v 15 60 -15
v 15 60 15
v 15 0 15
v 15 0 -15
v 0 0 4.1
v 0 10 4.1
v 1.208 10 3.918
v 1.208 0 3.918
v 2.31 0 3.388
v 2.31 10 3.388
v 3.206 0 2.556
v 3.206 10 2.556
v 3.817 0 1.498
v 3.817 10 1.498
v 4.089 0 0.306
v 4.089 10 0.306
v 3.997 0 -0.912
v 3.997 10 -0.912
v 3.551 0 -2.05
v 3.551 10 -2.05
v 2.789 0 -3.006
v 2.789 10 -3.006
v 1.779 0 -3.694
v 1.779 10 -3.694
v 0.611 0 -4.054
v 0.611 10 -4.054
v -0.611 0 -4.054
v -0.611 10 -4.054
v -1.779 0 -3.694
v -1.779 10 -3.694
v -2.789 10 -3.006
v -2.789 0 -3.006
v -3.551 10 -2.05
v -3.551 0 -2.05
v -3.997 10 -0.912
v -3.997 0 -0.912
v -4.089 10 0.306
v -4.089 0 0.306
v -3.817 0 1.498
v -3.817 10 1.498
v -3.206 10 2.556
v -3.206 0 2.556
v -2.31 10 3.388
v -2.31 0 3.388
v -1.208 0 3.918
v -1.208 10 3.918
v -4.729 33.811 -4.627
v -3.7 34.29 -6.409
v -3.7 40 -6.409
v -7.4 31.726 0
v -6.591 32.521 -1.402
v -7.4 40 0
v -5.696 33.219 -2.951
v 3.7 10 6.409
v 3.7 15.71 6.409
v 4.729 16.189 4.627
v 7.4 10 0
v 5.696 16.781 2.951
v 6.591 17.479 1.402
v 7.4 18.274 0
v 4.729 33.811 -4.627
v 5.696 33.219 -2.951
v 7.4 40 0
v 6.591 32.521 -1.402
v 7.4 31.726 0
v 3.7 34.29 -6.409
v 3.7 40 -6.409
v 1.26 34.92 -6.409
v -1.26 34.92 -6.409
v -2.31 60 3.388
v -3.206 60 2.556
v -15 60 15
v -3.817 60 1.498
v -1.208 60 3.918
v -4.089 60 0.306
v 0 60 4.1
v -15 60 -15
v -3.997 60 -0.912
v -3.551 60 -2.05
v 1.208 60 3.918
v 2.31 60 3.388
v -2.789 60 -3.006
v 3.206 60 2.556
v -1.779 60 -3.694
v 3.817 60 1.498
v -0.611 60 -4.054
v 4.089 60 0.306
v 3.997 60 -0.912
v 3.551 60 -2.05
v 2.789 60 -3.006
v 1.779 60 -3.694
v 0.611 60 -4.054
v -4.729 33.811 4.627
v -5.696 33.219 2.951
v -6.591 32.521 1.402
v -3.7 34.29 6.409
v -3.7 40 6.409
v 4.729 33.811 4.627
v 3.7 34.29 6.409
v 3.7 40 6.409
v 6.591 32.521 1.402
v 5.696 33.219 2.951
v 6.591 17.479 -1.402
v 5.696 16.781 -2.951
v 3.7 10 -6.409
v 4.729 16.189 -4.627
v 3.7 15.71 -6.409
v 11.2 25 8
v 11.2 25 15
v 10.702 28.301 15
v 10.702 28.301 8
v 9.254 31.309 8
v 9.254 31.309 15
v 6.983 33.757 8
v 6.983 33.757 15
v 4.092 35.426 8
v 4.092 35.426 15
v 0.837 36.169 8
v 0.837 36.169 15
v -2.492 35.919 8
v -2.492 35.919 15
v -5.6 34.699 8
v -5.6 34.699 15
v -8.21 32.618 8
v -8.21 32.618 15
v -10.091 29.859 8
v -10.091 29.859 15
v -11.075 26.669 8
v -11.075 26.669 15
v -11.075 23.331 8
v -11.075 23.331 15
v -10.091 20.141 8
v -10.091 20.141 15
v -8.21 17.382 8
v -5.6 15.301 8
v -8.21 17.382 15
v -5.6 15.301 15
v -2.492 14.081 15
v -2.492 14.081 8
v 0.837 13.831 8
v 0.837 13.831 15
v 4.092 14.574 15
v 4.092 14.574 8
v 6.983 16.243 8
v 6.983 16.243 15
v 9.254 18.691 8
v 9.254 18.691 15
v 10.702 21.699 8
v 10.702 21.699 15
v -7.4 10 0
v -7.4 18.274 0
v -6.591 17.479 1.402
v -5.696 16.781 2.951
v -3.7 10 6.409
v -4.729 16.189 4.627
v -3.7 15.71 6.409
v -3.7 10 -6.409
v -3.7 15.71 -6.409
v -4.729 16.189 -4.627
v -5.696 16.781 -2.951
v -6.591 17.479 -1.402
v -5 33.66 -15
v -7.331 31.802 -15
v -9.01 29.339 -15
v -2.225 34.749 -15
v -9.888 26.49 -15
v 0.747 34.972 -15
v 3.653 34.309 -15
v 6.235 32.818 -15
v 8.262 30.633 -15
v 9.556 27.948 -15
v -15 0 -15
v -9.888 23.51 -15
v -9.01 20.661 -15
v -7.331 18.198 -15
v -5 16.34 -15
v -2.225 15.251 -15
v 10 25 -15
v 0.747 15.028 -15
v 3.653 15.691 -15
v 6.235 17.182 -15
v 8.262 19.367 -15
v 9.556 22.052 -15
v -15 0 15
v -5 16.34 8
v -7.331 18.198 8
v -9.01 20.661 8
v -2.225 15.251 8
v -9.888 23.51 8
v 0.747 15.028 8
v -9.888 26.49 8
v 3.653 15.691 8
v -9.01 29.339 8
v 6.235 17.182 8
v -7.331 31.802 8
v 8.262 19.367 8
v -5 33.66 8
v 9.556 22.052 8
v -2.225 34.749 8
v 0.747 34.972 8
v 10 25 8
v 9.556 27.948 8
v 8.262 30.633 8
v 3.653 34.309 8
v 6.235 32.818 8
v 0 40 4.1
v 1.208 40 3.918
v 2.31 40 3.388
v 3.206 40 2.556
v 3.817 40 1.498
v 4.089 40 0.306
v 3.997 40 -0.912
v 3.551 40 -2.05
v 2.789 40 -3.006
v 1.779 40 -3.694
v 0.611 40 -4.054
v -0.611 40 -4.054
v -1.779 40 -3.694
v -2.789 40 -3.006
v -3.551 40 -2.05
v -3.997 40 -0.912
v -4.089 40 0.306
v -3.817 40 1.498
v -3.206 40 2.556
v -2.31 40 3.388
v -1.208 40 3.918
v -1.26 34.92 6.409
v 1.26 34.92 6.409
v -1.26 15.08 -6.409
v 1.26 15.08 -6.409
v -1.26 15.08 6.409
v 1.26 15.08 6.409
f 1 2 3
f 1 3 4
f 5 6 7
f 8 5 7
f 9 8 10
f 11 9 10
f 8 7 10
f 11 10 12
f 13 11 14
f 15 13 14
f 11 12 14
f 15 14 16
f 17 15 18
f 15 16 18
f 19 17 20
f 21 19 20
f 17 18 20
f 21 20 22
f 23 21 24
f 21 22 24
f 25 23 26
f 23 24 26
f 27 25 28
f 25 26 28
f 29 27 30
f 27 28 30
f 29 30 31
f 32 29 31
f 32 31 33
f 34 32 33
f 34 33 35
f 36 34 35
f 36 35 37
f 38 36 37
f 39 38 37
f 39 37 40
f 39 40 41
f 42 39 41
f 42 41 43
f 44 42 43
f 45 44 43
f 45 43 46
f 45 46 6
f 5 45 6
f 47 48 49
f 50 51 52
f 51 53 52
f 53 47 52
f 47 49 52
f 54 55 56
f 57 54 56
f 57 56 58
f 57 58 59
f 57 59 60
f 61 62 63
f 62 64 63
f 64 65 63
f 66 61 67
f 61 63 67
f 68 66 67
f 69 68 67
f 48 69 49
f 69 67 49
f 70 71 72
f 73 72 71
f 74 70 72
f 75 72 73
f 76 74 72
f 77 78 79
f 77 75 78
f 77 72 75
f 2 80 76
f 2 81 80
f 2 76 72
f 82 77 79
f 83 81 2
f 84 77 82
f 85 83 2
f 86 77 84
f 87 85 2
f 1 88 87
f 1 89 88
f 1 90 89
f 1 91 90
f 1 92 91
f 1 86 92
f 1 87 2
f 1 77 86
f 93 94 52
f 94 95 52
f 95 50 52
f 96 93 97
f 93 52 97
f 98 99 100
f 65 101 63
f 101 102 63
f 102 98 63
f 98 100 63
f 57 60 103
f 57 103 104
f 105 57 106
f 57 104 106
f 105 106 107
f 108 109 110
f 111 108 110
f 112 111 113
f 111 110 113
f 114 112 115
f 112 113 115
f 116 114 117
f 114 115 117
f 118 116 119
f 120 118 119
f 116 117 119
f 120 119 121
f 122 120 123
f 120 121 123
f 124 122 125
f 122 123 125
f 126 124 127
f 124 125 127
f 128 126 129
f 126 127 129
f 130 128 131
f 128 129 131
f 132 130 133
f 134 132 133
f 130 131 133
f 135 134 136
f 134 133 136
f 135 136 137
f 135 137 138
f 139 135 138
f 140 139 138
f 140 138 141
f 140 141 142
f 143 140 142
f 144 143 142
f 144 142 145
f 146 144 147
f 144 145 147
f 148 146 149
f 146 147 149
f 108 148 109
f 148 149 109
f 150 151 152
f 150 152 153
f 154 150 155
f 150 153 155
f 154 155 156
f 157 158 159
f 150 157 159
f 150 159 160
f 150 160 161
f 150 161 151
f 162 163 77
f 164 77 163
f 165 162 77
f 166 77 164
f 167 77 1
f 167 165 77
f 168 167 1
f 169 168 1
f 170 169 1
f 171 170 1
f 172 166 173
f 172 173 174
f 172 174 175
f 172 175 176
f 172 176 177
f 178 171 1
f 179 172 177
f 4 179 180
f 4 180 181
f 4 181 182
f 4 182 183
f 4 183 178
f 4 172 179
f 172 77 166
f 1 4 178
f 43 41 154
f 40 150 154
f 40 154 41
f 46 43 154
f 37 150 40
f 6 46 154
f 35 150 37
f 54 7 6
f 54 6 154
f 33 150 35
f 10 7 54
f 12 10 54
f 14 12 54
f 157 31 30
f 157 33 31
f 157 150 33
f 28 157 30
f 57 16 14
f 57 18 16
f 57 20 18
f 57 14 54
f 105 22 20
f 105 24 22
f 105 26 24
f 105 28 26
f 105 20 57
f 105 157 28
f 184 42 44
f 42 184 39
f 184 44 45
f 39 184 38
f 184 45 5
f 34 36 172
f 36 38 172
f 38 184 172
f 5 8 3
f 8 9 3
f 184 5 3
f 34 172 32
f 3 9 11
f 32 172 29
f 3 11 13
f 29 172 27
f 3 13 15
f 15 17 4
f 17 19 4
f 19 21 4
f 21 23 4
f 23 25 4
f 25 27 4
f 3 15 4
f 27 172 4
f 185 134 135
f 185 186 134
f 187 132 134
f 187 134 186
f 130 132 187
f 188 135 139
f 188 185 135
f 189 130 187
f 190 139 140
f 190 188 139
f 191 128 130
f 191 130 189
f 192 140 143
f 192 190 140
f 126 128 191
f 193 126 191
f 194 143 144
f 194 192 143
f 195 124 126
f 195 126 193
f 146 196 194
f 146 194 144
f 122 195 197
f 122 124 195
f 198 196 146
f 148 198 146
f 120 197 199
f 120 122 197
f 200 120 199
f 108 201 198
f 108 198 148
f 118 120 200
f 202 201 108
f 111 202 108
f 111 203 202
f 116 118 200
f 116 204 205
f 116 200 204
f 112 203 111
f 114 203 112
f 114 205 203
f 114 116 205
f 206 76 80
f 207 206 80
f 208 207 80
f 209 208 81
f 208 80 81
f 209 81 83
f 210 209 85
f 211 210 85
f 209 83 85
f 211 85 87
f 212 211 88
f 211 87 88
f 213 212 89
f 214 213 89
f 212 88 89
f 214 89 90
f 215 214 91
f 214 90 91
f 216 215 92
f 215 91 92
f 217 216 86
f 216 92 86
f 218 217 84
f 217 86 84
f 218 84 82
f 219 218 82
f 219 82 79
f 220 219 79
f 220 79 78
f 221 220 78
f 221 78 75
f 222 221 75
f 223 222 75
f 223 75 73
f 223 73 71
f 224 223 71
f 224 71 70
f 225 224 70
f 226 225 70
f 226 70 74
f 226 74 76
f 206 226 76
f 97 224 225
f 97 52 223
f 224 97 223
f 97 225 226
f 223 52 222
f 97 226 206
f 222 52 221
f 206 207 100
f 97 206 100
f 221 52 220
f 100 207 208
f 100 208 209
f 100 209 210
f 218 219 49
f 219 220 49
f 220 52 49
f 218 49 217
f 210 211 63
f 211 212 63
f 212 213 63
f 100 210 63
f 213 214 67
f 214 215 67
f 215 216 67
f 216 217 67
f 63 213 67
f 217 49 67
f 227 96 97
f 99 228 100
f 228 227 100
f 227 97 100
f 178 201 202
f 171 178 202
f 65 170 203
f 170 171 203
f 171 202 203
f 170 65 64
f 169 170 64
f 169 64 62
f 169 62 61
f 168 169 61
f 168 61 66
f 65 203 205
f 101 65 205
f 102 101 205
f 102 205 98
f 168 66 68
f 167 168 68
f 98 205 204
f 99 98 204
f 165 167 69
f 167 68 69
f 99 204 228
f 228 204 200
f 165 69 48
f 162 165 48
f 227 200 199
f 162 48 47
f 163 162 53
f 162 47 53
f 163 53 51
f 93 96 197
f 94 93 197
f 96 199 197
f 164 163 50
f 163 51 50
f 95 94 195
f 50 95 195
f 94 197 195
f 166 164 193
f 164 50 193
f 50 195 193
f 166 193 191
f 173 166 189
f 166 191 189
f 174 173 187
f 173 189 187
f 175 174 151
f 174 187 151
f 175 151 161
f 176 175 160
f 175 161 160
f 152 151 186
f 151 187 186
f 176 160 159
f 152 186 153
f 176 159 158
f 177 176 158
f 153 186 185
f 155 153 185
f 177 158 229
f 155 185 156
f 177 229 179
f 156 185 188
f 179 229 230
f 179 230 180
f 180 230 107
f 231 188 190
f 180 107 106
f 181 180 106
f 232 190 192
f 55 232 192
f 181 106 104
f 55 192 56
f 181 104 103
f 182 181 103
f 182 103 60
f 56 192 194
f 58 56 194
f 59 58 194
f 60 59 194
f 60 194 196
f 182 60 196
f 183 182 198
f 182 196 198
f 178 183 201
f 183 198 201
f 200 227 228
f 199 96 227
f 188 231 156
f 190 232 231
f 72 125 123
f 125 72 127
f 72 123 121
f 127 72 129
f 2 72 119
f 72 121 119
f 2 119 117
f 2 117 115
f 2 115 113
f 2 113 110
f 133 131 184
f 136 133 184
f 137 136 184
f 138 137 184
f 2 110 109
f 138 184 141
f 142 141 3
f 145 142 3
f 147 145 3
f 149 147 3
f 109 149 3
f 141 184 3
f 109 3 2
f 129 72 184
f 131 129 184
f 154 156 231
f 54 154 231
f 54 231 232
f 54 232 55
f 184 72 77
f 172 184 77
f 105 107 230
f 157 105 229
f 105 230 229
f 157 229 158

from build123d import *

# Parameters (mm, degrees)
SKETCH1_W           = 30
SKETCH1_H           = 30
BOSS_EXTRUDE1_DEPTH = 50
SKETCH2_R           = 10
CUT_EXTRUDE1_DEPTH  = 31
SKETCH3_R           = 11.2
CUT_EXTRUDE2_DEPTH  = 7
SKETCH4_W           = 30
SKETCH4_H           = 30
BOSS_EXTRUDE2_DEPTH = 10
SKETCH5_R           = 4.1
CUT_EXTRUDE3_DEPTH  = 61
CUT_EXTRUDE4_START  = -20
CUT_EXTRUDE4_DEPTH  = 30


with BuildPart() as part:
    # Sketch1 → Boss-Extrude1 (new body)
    with BuildSketch(Plane(origin=(0, 0, 0), x_dir=(1, 0, 0), z_dir=(0, 1, 0))):
        Rectangle(SKETCH1_W, SKETCH1_H)
    extrude(amount=BOSS_EXTRUDE1_DEPTH)

    # Sketch2 → Cut-Extrude1 (cut, through all)
    with BuildSketch(Plane.XY.offset(15)):
        with Locations((0, 25)):
            Circle(SKETCH2_R)
    extrude(amount=-CUT_EXTRUDE1_DEPTH, mode=Mode.SUBTRACT)

    # Sketch3 → Cut-Extrude2 (cut)
    with BuildSketch(Plane.XY.offset(15)):
        with Locations((0, 25)):
            Circle(SKETCH3_R)
    extrude(amount=-CUT_EXTRUDE2_DEPTH, mode=Mode.SUBTRACT)

    # Sketch4 → Boss-Extrude2 (add)
    with BuildSketch(Plane(origin=(0, 50, 0), x_dir=(1, 0, 0), z_dir=(0, 1, 0))):
        Rectangle(SKETCH4_W, SKETCH4_H)
    extrude(amount=BOSS_EXTRUDE2_DEPTH)

    # Sketch5 → Cut-Extrude3 (cut, through all)
    with BuildSketch(Plane(origin=(0, 60, 0), x_dir=(1, 0, 0), z_dir=(0, 1, 0))):
        with Locations(Location((0, 0, 0), (0, 0, 270))):  # turned: the seam where the file's is
            Circle(SKETCH5_R)
    extrude(amount=-CUT_EXTRUDE3_DEPTH, mode=Mode.SUBTRACT)

    # Sketch6 → Cut-Extrude4 (cut)
    with BuildSketch(Plane(origin=(0, 60, 0), x_dir=(1, 0, 0), z_dir=(0, 1, 0)).offset(CUT_EXTRUDE4_START)):
        Polygon((-3.7, 6.408587988), (-7.4, 0), (-3.7, -6.408587988), (3.7, -6.408587988), (7.4, 0), (3.7, 6.408587988), align=None)
    extrude(amount=-CUT_EXTRUDE4_DEPTH, mode=Mode.SUBTRACT)


solid = part.part
